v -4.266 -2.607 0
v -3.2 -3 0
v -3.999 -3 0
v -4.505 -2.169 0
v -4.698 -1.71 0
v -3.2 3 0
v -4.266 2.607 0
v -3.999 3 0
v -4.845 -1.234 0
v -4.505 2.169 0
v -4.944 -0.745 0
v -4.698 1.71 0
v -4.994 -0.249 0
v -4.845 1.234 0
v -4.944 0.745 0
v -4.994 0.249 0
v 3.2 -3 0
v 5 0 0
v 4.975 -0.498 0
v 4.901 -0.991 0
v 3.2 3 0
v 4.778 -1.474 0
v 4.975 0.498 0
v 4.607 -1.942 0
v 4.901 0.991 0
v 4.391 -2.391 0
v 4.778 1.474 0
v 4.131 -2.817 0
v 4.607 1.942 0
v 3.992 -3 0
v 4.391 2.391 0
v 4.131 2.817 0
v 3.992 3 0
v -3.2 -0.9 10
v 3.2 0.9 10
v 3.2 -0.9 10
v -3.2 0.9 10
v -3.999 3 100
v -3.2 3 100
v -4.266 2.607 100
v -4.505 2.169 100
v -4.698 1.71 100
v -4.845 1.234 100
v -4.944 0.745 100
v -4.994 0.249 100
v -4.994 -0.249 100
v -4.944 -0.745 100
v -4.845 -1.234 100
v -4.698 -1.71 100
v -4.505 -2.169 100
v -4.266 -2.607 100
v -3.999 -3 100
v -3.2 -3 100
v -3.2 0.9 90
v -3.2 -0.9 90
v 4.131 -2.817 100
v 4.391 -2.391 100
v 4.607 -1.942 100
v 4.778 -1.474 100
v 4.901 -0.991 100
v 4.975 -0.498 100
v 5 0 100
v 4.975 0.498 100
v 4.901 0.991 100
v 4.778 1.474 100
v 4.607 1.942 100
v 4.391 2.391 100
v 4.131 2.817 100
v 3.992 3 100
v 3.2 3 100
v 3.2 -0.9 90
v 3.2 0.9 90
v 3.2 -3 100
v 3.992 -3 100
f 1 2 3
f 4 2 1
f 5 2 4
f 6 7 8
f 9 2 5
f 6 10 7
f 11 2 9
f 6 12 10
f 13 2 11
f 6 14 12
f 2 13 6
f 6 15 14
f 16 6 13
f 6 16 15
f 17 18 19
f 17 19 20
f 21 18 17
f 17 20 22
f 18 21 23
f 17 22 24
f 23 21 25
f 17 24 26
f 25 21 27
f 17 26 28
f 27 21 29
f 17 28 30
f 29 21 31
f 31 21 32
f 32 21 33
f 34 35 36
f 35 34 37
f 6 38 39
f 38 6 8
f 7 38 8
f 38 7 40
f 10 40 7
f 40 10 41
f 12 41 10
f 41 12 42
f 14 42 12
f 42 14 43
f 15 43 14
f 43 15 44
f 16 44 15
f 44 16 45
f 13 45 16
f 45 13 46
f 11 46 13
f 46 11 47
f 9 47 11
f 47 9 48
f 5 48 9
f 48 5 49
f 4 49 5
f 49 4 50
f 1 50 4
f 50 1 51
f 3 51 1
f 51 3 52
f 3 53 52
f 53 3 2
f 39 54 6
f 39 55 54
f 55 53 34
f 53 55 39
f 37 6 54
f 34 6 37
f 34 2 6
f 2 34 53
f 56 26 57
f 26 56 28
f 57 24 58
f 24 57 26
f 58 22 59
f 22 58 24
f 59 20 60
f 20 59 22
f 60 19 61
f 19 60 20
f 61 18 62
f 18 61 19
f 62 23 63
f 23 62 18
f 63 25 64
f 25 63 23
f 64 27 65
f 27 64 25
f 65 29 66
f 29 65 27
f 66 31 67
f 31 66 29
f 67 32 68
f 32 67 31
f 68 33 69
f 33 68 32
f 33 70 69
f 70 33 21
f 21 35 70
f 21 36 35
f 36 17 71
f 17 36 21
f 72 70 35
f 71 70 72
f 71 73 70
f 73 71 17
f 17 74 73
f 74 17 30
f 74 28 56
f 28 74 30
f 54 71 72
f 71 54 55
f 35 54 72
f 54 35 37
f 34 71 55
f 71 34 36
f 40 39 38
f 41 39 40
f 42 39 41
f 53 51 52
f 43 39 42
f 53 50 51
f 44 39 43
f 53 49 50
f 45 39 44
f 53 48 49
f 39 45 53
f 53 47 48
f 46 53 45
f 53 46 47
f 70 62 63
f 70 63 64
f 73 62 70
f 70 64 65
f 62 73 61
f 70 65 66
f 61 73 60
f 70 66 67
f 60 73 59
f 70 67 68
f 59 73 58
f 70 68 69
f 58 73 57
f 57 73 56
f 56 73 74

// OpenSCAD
$fs = 0.5;
$fa = 0.5;

t = 1.8;

d = 10;
w = 6;
l = 100;
p = 10;



module shape(l) {
    difference() {
        intersection() {
            circle(d = d);
            square([d, w], center=true);
        }
        if (l) {
            square([d - t*2, d], center=true);
        } else {
            translate([0,w/4+t/2])
            square([d - t*2, w / 2], center=true);
            translate([0,-(w/4+t/2)])
            square([d - t*2, w / 2], center=true);
        }
    }
}

linear_extrude(p)
shape(true);

translate([0,0,p])
linear_extrude(l-p*2)
shape(false);

translate([0,0,l-p])
linear_extrude(p)
shape(true);
